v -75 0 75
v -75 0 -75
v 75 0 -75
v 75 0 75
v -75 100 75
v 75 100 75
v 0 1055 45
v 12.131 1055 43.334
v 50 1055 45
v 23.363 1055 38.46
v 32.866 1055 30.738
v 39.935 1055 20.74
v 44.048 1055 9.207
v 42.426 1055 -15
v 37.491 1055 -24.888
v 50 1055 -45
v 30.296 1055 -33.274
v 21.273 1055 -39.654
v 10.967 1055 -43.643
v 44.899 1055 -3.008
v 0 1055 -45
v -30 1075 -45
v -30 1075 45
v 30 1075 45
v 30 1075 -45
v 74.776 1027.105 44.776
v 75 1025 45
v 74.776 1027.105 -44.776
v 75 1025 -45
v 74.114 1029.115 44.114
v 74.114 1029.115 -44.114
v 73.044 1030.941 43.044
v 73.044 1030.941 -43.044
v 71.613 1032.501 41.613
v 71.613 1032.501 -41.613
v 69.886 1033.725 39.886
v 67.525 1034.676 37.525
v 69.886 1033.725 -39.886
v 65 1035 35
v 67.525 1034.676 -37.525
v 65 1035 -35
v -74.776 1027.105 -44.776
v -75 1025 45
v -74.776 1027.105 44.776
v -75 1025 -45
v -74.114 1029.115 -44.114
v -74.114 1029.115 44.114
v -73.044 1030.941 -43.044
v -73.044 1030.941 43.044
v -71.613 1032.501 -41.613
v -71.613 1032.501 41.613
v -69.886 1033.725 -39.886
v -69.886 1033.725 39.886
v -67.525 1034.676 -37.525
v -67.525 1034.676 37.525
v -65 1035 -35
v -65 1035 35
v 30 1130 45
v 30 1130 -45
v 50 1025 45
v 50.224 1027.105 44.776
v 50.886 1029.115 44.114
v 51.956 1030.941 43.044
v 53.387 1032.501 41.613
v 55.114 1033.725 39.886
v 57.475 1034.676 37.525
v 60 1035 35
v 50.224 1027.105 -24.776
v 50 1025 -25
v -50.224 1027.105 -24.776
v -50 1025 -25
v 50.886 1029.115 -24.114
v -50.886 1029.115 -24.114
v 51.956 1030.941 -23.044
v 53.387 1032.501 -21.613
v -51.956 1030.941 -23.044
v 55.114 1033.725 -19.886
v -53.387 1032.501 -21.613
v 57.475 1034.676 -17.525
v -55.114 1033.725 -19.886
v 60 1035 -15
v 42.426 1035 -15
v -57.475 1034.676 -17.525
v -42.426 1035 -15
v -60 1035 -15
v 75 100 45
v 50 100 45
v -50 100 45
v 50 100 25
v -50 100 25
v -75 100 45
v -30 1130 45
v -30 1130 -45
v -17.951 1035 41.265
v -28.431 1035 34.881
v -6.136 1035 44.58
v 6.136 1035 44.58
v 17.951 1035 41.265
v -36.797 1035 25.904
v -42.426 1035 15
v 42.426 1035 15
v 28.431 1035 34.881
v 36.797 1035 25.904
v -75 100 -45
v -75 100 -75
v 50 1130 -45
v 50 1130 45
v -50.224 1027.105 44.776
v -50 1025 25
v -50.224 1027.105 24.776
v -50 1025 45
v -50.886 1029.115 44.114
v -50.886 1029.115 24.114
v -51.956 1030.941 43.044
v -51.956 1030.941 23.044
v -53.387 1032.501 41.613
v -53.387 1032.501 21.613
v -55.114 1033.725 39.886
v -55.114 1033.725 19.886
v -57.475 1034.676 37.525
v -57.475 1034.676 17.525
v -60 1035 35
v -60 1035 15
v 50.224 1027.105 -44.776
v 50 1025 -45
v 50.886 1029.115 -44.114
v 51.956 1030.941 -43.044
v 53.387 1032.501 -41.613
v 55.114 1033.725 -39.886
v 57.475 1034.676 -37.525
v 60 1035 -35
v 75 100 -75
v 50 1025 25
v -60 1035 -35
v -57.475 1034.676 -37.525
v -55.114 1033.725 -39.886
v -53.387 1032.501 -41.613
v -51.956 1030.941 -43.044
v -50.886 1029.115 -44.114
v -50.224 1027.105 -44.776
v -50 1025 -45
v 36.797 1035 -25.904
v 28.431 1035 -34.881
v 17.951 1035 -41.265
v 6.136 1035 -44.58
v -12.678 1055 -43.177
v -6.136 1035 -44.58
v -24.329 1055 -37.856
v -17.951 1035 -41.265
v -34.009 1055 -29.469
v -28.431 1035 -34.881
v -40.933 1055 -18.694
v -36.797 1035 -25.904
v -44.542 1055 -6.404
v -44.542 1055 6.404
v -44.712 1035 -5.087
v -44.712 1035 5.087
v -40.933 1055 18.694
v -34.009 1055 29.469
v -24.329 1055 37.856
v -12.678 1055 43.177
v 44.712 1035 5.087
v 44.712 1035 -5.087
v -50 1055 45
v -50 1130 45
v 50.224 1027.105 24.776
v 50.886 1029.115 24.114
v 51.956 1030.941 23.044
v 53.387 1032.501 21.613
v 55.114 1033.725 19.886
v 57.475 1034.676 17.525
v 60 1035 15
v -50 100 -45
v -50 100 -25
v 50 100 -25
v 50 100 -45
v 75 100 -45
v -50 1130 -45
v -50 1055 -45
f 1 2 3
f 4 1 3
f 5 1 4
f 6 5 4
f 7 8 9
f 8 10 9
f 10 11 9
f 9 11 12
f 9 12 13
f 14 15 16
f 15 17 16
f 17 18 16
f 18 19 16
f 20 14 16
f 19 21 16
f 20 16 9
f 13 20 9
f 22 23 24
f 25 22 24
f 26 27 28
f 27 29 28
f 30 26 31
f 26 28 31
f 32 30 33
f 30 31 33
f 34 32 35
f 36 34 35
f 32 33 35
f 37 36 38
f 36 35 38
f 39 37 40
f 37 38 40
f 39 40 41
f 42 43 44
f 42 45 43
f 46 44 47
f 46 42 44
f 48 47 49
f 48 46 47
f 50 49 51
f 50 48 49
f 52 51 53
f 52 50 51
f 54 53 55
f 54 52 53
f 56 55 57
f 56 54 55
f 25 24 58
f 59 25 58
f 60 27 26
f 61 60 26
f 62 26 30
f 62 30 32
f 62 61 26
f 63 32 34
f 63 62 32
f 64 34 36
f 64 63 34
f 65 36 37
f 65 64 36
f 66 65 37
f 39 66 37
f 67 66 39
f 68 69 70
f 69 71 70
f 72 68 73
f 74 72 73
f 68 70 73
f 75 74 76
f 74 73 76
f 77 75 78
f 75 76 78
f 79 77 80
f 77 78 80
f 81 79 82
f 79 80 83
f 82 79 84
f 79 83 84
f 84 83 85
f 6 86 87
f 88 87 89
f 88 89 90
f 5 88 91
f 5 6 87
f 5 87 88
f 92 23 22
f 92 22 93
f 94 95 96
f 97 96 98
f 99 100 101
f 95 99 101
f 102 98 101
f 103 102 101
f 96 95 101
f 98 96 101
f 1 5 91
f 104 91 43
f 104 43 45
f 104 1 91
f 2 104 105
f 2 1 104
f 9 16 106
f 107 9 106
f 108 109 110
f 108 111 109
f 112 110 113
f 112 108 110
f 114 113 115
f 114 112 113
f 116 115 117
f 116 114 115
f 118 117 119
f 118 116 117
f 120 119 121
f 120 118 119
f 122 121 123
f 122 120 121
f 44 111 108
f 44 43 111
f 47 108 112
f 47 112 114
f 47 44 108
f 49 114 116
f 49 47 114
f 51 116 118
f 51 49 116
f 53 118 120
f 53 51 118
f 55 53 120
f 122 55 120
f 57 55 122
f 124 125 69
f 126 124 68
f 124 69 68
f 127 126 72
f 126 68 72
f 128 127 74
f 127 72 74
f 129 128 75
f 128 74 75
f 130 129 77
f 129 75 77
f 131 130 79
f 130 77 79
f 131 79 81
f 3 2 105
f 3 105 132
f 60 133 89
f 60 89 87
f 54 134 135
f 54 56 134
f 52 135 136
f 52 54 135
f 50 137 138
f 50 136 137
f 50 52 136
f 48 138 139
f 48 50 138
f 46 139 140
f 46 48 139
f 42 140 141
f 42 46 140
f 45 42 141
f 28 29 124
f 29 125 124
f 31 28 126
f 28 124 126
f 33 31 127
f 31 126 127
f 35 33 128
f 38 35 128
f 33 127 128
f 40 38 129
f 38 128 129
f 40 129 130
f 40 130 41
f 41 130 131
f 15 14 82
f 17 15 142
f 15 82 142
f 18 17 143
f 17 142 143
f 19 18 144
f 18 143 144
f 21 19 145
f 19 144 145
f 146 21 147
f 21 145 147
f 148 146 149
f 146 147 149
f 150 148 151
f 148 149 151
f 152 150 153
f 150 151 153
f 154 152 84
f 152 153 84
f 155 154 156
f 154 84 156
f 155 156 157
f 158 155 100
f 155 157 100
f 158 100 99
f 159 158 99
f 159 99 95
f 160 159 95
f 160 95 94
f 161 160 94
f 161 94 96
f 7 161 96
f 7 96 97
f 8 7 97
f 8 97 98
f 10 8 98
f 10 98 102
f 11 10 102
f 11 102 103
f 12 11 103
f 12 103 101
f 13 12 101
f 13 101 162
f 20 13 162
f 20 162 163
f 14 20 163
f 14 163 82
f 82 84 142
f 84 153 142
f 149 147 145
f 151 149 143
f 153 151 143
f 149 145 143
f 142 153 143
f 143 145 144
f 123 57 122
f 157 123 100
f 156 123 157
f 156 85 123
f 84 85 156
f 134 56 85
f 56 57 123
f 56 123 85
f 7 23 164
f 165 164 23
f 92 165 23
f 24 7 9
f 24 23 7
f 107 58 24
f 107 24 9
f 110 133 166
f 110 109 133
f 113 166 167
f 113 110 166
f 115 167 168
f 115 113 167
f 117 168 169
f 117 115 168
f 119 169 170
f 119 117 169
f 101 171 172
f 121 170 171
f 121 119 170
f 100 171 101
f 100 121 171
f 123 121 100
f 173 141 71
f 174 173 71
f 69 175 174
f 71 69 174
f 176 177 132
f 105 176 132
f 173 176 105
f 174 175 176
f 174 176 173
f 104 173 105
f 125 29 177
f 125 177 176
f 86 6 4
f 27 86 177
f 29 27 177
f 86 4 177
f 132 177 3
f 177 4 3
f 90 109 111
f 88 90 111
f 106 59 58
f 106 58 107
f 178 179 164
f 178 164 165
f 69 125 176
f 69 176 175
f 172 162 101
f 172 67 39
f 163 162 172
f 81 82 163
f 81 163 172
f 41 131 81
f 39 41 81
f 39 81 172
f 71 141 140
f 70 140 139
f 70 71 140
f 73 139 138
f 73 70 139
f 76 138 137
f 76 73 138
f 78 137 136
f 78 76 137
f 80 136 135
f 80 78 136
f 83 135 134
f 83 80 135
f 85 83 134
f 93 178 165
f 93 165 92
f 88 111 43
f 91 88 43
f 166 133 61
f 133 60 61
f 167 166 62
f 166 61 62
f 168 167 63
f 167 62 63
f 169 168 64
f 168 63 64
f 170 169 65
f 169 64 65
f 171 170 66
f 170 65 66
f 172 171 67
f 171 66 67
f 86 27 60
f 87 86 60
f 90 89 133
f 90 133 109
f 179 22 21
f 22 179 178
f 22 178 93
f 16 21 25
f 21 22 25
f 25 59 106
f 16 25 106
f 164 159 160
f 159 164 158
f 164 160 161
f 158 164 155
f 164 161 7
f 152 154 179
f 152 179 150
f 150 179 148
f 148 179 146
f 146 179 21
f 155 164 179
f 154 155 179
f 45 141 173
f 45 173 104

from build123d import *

# Parameters (mm, degrees)
SKETCH2_W           = 150
SKETCH2_H           = 150
BOSS_EXTRUDE1_DEPTH = 1035
SKETCH3_W           = 100
SKETCH3_H           = 50
CUT_EXTRUDE3_DEPTH  = 935
SKETCH4_W           = 150
SKETCH4_H           = 30
CUT_EXTRUDE4_DEPTH  = 935
FILLET1_R           = 10
SKETCH5_R           = 45
BOSS_EXTRUDE2_DEPTH = 20
BOSS_EXTRUDE3_START = -45
SKETCH6_W           = 100
SKETCH6_H           = 75
BOSS_EXTRUDE3_DEPTH = 90
SKETCH7_W           = 60
SKETCH7_H           = 110
CUT_EXTRUDE5_DEPTH  = 90


with BuildPart() as part:
    # Sketch2 → Boss-Extrude1 (new body)
    with BuildSketch(Plane(origin=(0, 0, 0), x_dir=(1, 0, 0), z_dir=(0, 1, 0))):
        Rectangle(SKETCH2_W, SKETCH2_H)
    extrude(amount=BOSS_EXTRUDE1_DEPTH)

    # Sketch3 → Cut-Extrude3 (cut)
    with BuildSketch(Plane(origin=(0, 1035, 0), x_dir=(-1, 0, 0), z_dir=(0, 1, 0))):
        with Locations((0, -50)):
            Rectangle(SKETCH3_W, SKETCH3_H)
        with Locations((0, 50)):
            Rectangle(SKETCH3_W, SKETCH3_H)
    extrude(amount=-CUT_EXTRUDE3_DEPTH, mode=Mode.SUBTRACT)

    # Sketch4 → Cut-Extrude4 (cut)
    with BuildSketch(Plane(origin=(0, 1035, 0), x_dir=(-1, 0, 0), z_dir=(0, 1, 0))):
        with Locations((0, -60)):
            Rectangle(SKETCH4_W, SKETCH4_H)
        with Locations((0, 60)):
            Rectangle(SKETCH4_W, SKETCH4_H)
    extrude(amount=-CUT_EXTRUDE4_DEPTH, mode=Mode.SUBTRACT)

    # Fillet1
    fillet1_edges = [part.edges().sort_by_distance(p)[0] for p in [
        (0, 1035, -25),
        (50, 1035, -35),
        (0, 1035, 25),
        (-50, 1035, 35),
        (-50, 1035, -35),
        (-75, 1035, 0),
        (-62.5, 1035, -45),
        (62.5, 1035, -45),
        (50, 1035, 35),
        (75, 1035, 0),
        (62.5, 1035, 45),
        (-62.5, 1035, 45),
    ]]
    fillet(fillet1_edges, radius=FILLET1_R)

    # Sketch5 → Boss-Extrude2 (add)
    with BuildSketch(Plane(origin=(0, 1035, 0), x_dir=(-1, 0, 0), z_dir=(0, 1, 0))):
        with Locations(Location((0, 0, 0), (0, 0, 199.471220634))):
            Circle(SKETCH5_R)
    extrude(amount=BOSS_EXTRUDE2_DEPTH)

    # Sketch6 → Boss-Extrude3 (add)
    with BuildSketch(Plane.XY.offset(BOSS_EXTRUDE3_START)):
        with Locations((0, 1092.5)):
            Rectangle(SKETCH6_W, SKETCH6_H)
    extrude(amount=BOSS_EXTRUDE3_DEPTH)

    # Sketch7 → Cut-Extrude5 (cut)
    with BuildSketch(Plane.XY.offset(45)):
        with Locations((0, 1130)):
            Rectangle(SKETCH7_W, SKETCH7_H)
    extrude(amount=-CUT_EXTRUDE5_DEPTH, mode=Mode.SUBTRACT)


solid = part.part
